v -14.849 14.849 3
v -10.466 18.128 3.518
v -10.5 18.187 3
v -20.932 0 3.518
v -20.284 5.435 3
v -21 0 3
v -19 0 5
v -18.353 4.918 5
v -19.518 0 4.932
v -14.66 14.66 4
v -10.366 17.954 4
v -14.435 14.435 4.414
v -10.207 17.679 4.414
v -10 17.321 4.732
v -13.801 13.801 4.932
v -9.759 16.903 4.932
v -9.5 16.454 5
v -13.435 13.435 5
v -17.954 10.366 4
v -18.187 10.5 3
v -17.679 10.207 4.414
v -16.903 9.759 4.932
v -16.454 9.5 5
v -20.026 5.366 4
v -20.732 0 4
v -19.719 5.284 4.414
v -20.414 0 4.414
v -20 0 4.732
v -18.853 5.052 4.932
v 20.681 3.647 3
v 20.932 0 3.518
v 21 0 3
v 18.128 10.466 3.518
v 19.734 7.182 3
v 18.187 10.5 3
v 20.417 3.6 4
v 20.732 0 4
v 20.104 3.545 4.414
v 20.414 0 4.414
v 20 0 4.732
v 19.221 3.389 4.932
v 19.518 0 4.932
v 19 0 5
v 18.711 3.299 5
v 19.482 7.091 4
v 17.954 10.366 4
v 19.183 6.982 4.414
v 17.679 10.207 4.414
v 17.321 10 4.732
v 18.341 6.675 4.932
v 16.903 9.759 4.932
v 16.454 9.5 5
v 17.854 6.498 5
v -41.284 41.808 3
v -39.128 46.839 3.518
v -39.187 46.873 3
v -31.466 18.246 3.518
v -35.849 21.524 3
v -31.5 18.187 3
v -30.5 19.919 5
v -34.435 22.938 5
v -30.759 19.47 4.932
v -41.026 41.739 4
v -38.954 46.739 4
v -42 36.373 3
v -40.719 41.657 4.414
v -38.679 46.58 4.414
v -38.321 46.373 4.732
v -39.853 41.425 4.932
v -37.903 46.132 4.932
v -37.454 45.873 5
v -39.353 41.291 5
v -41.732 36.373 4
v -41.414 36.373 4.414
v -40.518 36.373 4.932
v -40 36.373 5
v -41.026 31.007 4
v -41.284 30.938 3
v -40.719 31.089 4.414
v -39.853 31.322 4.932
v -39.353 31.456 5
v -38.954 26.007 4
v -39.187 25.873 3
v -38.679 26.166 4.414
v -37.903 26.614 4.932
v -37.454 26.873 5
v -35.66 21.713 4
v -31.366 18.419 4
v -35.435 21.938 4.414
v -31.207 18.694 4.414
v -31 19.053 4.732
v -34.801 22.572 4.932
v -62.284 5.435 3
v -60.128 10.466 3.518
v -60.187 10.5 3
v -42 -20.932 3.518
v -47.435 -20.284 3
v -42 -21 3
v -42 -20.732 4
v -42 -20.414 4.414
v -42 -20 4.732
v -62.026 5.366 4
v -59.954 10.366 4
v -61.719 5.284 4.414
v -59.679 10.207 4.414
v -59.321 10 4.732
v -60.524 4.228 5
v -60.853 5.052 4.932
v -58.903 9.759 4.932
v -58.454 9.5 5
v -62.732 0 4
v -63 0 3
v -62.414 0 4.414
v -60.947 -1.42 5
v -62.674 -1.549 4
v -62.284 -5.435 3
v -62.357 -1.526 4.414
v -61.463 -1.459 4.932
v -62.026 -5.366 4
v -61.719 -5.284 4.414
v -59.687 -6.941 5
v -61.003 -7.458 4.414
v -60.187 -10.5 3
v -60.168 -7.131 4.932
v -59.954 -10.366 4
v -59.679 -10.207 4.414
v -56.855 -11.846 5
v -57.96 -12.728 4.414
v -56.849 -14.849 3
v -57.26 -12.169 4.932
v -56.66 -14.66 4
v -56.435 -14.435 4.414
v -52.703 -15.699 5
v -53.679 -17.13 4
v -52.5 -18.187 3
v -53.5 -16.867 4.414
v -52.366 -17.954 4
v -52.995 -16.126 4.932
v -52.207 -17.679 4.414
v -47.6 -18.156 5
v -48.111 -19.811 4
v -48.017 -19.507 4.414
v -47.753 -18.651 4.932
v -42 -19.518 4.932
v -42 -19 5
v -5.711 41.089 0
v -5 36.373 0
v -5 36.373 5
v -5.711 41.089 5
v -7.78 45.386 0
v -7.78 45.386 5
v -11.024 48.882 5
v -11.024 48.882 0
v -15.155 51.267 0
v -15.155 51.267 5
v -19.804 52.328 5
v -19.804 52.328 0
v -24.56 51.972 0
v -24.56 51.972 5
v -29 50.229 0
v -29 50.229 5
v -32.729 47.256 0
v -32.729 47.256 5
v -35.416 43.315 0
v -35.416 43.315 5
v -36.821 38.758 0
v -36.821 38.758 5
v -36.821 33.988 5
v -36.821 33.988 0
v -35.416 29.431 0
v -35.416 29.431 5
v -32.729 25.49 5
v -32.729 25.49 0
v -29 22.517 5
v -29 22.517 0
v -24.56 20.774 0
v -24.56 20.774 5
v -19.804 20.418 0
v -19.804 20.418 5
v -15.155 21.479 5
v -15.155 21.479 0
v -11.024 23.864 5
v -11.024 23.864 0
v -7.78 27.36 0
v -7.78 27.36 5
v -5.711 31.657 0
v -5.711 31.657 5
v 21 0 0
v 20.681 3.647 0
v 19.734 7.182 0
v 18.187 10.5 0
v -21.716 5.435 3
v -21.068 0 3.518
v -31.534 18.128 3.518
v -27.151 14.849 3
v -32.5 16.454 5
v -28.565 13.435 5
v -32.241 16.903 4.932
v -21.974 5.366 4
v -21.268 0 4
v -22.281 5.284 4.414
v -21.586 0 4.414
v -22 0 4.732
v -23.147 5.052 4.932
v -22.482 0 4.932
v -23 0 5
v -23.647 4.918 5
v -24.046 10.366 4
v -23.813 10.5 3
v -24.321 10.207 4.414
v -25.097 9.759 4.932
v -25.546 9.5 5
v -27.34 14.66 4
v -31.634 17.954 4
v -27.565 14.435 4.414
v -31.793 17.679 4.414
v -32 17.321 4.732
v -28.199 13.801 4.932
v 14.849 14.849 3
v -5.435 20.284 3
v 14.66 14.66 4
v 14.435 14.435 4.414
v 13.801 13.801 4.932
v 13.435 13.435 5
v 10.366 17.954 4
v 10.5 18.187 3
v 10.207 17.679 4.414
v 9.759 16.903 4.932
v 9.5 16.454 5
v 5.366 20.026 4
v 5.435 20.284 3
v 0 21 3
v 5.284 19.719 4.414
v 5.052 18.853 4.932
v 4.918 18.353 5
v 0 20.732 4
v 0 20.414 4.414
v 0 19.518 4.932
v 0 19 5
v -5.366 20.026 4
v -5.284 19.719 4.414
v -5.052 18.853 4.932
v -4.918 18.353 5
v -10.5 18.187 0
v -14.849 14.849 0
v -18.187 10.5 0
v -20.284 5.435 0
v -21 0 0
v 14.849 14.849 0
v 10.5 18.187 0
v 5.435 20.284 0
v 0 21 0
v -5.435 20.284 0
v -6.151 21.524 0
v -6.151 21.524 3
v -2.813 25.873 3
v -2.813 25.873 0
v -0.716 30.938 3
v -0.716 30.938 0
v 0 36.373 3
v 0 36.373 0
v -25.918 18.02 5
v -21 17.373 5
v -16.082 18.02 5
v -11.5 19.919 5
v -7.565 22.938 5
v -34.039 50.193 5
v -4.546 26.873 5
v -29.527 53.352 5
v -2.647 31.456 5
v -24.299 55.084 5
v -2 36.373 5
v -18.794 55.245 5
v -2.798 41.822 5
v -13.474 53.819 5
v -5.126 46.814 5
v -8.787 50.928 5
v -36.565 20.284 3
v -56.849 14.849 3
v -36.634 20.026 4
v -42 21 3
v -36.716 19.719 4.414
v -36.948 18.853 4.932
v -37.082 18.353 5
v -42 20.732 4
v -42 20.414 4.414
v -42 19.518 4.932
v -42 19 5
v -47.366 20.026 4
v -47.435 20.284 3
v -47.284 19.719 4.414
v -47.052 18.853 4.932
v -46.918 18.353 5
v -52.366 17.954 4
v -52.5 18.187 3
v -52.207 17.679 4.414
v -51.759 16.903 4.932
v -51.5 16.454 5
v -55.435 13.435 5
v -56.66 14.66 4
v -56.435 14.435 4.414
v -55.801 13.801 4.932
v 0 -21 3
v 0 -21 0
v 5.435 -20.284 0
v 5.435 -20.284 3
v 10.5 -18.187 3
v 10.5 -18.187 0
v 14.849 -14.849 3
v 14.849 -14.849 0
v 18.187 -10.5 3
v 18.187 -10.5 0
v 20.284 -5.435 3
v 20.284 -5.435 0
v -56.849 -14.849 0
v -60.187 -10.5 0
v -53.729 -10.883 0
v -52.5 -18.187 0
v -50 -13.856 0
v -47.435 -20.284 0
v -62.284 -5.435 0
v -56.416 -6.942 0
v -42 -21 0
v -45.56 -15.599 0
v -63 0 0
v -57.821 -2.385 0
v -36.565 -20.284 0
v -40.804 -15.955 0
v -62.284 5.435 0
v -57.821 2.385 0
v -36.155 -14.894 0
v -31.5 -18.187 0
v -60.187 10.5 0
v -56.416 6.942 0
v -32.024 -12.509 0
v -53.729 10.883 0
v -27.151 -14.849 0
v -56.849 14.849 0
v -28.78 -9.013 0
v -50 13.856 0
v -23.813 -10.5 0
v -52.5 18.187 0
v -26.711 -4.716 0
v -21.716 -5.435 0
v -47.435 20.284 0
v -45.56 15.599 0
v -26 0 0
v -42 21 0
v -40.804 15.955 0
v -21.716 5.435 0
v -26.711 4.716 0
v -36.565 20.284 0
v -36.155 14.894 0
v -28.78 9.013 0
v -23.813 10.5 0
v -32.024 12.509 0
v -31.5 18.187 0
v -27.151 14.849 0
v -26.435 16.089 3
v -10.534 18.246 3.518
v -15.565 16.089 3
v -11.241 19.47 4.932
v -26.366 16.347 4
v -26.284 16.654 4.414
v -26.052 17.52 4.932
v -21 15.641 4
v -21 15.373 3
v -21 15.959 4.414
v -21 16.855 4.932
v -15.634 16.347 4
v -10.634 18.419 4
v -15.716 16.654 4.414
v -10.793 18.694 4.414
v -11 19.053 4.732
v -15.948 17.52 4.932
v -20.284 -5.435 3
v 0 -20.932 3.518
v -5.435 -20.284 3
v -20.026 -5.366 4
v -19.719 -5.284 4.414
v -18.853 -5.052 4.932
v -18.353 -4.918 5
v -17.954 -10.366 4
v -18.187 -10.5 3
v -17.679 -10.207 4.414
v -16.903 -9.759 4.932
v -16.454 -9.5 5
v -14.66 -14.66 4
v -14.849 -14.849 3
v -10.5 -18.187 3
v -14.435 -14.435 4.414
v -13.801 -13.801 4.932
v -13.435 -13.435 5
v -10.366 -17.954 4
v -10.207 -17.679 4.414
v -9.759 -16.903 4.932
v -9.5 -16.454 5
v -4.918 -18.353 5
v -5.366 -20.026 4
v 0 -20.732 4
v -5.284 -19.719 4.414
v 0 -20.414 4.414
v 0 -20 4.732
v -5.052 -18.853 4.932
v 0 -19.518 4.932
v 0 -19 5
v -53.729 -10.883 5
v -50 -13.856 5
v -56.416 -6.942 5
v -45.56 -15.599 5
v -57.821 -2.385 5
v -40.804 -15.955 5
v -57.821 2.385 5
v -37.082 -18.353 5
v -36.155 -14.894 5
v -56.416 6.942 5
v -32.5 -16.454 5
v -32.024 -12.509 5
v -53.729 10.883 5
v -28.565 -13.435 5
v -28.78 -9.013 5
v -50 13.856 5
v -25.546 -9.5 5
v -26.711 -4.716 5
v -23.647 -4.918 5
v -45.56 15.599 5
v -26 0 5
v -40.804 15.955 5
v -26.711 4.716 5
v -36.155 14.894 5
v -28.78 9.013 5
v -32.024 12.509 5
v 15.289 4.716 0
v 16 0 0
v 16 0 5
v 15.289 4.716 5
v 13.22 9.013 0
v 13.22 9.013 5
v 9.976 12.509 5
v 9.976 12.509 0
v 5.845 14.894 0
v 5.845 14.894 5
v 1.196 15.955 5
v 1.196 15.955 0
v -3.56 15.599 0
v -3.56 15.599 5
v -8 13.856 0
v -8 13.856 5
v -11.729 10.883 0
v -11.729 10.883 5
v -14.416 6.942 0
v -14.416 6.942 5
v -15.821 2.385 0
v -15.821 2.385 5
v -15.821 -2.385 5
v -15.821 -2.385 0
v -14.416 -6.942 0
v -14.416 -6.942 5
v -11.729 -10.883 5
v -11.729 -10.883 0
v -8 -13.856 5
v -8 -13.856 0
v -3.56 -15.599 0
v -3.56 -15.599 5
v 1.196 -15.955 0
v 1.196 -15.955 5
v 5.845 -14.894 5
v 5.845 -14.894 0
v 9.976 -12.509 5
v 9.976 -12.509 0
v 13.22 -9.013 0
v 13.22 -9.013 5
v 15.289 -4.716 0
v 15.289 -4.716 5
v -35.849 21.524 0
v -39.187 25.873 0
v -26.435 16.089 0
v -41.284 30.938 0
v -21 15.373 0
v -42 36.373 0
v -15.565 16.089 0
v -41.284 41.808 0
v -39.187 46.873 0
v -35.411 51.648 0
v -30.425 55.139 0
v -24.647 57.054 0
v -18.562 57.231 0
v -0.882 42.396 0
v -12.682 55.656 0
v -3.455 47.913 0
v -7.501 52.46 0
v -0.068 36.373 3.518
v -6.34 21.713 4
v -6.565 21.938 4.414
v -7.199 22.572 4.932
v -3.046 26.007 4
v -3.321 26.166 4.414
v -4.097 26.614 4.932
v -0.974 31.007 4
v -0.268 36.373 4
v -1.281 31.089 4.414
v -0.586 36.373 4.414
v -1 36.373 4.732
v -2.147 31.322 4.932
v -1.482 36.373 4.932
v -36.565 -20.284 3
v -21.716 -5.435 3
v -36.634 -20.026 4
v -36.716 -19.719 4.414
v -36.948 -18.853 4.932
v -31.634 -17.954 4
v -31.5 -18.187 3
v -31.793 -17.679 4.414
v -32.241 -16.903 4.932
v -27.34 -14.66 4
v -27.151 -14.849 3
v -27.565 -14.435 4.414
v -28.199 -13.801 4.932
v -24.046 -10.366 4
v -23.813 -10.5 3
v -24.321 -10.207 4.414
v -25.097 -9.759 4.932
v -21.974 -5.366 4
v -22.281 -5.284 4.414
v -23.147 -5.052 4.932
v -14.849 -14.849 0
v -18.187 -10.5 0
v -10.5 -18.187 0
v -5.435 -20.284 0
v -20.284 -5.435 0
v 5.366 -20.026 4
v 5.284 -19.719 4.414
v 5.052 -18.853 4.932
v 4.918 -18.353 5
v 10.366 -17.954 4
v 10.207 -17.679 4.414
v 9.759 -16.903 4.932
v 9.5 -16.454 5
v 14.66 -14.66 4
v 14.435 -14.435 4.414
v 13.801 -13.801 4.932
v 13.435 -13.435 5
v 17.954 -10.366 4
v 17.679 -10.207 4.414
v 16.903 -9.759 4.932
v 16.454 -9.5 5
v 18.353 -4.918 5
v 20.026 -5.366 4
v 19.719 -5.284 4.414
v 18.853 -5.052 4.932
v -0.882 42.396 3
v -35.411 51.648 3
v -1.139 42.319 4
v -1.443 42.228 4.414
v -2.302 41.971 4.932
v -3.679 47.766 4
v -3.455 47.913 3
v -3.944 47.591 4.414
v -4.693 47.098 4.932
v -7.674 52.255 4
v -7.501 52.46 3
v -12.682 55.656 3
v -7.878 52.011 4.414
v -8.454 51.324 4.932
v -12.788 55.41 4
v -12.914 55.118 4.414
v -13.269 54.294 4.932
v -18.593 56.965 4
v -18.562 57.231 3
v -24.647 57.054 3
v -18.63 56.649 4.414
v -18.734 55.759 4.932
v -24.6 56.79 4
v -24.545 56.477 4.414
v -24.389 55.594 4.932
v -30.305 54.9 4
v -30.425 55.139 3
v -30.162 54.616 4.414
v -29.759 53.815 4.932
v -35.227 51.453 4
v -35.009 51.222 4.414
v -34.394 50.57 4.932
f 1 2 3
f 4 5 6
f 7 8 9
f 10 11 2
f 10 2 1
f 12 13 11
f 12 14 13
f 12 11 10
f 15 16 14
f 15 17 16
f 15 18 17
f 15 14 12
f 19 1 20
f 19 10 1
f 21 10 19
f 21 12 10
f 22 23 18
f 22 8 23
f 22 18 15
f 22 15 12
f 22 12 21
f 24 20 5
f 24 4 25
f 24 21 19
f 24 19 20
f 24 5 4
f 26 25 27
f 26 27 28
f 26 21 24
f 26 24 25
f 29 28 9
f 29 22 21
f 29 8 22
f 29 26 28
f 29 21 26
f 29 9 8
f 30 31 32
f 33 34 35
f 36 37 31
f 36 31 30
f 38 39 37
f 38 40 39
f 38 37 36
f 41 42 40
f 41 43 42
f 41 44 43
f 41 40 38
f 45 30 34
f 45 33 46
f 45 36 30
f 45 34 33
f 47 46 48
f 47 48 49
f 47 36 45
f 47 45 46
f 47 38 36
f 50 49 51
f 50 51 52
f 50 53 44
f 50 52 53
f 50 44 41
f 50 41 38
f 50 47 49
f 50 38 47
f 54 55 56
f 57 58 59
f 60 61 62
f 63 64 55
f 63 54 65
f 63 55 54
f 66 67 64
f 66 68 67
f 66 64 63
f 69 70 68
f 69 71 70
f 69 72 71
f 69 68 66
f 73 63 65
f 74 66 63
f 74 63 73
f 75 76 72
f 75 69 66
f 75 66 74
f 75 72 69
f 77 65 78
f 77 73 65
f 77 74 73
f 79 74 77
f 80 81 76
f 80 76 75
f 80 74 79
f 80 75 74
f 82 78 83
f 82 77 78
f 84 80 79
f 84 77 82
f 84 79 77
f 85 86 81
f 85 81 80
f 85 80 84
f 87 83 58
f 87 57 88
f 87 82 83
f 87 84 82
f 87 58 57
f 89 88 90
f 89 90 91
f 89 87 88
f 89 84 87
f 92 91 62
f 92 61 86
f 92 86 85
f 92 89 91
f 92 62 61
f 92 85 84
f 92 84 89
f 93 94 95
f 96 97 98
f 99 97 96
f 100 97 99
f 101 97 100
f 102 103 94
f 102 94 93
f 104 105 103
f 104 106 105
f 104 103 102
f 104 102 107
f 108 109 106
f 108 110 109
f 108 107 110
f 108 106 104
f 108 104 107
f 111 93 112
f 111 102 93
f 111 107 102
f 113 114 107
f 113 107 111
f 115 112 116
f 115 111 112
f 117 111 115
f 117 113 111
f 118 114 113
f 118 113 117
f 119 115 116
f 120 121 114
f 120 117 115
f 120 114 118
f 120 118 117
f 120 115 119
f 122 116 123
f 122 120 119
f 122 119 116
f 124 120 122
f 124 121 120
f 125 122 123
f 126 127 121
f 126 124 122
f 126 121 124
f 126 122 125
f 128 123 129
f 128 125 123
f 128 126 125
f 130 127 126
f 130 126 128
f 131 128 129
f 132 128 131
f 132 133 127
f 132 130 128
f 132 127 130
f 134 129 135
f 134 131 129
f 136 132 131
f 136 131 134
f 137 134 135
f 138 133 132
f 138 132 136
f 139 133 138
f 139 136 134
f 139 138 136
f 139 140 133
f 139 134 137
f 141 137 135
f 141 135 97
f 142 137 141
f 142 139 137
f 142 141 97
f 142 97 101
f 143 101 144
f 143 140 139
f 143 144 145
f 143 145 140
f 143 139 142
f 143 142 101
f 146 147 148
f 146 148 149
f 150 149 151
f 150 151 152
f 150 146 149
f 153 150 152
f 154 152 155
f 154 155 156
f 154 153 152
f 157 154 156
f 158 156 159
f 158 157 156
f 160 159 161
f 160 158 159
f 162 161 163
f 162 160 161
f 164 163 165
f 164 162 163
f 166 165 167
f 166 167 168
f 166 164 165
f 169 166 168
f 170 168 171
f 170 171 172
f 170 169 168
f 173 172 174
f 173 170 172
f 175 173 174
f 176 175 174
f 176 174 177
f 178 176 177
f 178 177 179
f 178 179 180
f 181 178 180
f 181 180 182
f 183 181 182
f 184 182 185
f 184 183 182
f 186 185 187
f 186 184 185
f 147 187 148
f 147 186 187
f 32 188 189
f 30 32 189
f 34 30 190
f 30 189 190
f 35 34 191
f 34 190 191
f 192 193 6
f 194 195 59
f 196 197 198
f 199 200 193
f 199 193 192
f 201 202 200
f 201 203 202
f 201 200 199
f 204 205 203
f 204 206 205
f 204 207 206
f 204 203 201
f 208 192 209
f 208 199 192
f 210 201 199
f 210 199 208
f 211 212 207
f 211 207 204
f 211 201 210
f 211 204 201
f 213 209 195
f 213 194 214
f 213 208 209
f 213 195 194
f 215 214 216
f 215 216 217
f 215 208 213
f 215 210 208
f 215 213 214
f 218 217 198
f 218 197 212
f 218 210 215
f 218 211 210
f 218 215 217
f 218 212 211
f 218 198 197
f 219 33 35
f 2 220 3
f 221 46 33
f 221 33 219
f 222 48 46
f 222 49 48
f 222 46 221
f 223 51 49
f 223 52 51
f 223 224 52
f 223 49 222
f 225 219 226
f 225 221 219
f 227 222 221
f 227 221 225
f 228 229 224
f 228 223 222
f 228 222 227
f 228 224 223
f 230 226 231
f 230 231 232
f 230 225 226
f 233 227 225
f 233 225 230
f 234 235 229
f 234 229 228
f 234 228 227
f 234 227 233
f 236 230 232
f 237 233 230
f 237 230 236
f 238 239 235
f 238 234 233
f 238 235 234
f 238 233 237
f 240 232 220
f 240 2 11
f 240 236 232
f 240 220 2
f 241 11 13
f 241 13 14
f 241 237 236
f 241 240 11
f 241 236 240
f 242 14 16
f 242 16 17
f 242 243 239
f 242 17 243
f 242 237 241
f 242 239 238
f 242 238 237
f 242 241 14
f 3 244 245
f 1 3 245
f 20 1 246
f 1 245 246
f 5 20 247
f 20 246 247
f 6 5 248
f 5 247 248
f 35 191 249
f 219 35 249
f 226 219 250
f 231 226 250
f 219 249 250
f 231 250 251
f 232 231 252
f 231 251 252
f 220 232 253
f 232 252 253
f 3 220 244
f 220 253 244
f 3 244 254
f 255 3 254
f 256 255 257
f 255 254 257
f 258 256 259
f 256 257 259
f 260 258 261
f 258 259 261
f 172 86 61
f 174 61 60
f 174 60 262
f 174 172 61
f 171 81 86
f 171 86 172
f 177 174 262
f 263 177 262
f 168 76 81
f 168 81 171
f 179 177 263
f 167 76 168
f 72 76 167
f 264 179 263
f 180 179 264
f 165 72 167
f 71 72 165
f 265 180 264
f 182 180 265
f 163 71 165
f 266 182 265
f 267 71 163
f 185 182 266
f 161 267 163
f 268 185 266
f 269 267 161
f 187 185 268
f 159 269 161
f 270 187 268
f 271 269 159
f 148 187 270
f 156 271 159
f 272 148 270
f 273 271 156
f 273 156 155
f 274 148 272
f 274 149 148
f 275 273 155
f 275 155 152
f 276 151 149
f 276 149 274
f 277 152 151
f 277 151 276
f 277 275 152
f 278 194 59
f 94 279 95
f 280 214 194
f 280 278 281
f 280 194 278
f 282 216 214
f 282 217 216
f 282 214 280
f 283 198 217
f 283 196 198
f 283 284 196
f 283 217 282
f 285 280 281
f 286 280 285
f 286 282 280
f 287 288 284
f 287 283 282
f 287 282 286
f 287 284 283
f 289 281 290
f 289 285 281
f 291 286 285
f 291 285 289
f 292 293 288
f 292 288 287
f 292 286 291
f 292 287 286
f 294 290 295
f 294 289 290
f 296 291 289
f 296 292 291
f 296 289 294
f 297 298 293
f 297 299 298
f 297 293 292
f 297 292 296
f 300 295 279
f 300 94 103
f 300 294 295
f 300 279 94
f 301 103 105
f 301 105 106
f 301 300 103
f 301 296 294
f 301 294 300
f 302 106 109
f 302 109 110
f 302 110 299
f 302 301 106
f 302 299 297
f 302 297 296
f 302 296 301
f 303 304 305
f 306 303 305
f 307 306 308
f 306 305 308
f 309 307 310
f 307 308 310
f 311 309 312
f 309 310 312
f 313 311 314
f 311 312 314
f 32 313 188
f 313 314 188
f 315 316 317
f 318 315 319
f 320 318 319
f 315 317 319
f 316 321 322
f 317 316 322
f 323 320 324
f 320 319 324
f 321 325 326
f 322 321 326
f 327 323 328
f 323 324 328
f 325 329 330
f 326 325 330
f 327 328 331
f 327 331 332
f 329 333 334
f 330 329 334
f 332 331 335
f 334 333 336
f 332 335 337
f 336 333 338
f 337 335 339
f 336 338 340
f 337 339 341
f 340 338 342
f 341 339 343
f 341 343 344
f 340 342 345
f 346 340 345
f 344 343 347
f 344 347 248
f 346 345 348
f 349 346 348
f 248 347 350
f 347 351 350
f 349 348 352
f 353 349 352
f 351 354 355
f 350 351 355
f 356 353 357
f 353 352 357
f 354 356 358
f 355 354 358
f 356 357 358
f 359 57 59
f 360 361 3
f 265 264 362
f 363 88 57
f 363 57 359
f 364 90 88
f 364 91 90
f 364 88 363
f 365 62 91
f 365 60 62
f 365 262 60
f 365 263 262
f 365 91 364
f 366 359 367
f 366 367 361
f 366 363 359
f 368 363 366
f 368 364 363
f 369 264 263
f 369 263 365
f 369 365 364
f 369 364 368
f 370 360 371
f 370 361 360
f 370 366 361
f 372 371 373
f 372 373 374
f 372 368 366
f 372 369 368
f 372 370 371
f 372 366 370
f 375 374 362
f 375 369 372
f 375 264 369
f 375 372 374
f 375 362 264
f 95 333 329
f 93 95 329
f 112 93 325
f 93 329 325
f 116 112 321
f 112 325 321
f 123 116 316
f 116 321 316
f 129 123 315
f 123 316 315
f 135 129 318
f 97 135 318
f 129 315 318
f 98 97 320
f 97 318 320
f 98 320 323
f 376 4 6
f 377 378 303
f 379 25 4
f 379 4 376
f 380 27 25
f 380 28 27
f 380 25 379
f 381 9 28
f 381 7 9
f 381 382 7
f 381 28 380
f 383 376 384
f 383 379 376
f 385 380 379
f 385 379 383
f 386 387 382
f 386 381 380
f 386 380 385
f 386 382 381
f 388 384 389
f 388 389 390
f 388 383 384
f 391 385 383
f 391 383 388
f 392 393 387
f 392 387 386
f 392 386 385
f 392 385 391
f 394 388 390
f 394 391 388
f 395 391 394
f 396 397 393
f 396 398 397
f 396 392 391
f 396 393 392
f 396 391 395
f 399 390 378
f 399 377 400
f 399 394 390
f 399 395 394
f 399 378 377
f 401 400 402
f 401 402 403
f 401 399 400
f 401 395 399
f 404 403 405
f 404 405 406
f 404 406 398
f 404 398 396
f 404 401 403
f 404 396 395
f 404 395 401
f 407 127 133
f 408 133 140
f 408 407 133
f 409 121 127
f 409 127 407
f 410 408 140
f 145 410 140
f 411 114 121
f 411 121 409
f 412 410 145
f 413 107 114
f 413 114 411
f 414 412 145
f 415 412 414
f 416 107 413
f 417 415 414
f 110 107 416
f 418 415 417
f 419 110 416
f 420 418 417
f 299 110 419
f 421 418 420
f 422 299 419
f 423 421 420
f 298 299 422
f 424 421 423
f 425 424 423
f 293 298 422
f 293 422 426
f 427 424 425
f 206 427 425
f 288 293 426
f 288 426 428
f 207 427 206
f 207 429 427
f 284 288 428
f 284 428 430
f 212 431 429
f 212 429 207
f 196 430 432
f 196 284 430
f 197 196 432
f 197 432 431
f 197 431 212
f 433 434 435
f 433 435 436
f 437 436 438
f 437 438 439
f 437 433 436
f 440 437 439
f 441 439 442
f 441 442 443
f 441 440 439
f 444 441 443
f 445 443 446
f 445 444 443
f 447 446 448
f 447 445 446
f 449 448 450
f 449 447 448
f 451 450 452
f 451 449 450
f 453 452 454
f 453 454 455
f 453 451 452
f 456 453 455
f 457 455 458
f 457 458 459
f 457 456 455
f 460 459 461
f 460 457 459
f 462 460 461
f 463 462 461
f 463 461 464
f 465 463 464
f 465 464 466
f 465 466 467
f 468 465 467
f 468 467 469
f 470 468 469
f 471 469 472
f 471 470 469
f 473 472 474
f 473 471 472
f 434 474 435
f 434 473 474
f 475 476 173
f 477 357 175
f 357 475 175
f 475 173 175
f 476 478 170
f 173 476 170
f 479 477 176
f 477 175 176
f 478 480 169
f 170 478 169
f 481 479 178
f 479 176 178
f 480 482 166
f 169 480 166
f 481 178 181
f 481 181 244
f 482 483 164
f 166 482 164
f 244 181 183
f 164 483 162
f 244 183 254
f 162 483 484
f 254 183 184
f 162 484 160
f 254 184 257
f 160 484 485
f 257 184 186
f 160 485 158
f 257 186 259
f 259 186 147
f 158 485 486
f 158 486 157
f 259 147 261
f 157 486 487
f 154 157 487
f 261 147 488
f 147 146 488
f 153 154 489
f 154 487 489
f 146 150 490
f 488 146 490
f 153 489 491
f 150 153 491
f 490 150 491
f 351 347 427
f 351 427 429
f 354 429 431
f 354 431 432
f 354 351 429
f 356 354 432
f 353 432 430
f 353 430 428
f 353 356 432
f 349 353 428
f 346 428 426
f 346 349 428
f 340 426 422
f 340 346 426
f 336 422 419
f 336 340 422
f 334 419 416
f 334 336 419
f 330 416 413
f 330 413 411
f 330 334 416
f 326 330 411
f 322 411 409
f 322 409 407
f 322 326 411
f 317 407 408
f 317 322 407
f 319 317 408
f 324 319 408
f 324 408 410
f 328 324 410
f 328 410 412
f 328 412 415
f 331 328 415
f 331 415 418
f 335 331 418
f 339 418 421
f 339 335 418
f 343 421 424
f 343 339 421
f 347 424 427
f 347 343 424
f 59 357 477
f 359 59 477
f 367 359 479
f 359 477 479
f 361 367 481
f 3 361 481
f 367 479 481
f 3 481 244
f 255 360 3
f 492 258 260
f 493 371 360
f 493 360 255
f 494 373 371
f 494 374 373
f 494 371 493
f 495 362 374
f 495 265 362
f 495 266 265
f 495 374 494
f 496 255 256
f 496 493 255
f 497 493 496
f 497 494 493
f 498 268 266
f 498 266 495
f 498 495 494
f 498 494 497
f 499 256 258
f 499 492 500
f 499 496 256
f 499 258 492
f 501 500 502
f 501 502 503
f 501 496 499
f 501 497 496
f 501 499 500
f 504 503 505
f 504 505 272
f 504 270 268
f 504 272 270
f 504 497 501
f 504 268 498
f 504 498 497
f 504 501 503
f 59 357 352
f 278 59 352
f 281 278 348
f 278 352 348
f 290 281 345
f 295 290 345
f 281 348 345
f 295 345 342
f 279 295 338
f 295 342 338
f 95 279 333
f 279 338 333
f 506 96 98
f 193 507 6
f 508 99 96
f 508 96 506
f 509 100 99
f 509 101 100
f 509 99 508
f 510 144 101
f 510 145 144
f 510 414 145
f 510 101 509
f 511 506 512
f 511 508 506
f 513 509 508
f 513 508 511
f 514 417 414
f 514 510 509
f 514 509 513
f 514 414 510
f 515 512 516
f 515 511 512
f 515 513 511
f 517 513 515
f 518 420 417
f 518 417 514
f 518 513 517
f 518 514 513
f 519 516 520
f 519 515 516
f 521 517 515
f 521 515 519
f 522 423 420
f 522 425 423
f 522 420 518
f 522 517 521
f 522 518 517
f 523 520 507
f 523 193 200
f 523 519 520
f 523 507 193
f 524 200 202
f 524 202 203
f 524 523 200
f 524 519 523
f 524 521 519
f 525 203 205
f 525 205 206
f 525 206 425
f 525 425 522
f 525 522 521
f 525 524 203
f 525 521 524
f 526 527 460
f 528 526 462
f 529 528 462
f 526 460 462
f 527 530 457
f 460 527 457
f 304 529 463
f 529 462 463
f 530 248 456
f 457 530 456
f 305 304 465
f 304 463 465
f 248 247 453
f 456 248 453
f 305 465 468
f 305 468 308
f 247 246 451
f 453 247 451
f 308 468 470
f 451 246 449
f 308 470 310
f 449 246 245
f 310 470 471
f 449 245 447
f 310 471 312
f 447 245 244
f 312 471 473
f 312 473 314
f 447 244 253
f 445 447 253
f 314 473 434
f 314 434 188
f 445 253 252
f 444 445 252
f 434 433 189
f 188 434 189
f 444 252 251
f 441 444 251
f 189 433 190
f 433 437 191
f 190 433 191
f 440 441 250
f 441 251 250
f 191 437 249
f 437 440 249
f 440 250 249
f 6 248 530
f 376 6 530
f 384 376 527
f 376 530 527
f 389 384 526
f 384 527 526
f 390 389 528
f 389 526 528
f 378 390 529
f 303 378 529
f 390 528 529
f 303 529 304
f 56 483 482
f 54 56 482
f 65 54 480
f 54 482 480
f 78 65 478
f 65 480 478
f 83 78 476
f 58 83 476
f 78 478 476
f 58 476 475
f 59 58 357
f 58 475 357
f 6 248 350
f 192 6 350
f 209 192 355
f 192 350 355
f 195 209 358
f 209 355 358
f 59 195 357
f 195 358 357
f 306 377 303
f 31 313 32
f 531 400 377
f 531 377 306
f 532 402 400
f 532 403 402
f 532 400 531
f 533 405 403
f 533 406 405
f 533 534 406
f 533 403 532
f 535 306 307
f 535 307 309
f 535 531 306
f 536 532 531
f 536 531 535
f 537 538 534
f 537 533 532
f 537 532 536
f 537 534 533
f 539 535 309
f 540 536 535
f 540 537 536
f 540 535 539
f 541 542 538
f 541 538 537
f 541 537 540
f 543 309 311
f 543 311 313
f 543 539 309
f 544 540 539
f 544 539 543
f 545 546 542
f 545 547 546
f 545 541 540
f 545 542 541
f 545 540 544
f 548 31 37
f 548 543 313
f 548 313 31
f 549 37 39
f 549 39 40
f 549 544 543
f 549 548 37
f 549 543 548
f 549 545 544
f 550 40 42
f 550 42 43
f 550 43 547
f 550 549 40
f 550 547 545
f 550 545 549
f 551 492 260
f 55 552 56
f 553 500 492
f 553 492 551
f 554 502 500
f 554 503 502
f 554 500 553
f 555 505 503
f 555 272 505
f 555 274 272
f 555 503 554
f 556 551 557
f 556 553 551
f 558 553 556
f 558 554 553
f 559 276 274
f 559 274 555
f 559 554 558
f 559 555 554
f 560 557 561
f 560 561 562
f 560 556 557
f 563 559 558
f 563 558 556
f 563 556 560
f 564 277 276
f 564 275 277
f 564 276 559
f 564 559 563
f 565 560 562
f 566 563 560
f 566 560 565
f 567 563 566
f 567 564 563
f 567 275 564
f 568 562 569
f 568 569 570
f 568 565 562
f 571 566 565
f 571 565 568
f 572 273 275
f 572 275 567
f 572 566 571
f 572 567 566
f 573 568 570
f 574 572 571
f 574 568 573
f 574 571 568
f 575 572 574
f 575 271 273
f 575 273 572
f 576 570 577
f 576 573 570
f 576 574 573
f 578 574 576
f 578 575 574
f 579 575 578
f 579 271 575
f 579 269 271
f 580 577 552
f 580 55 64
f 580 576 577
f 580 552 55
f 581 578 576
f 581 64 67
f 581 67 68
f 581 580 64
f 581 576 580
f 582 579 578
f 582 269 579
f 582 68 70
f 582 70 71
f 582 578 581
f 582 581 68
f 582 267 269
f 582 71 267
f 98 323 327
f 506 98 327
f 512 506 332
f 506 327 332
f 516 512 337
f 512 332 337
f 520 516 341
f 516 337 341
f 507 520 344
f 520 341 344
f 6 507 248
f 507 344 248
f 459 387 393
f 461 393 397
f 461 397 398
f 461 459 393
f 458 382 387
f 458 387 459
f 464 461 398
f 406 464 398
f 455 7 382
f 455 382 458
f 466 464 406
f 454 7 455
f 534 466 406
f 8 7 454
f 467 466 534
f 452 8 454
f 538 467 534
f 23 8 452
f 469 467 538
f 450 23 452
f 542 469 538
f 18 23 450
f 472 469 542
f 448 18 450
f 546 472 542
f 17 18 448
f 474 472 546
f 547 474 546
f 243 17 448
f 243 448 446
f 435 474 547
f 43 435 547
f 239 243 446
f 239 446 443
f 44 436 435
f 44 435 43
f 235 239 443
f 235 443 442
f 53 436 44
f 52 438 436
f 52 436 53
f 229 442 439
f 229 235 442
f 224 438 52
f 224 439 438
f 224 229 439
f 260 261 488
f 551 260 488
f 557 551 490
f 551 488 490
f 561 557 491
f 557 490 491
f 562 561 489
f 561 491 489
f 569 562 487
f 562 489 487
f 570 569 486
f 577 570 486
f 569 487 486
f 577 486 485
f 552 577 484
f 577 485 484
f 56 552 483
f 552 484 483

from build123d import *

# Parameters (mm, degrees)
F0_R     = 16
F1_DEPTH = 5
F2_R     = 2
F2_2_R   = 2
F2_3_R   = 2


with BuildPart() as f1:
    # F0 (on Top) → F1 (new body)
    with BuildSketch(Plane.XY):
        with BuildLine():
            ThreePointArc((-42.0000000626, -21), (-27.1507576172, -14.849242427), (-21, 0))
            ThreePointArc((-21, 0), (-23.8134663476, 10.4999997004), (-31.4999994009, 18.1865331336))
            ThreePointArc((-31.4999994009, 18.1865331336), (-47.4351994623, 20.284442482), (-60.1865333234, 10.5000002703))
            ThreePointArc((-60.1865333234, 10.5000002703), (-60.1865335731, -10.4999998378), (-42.0000000626, -21))
        make_face()
        with Locations((-42, 0)):
            Circle(F0_R, mode=Mode.SUBTRACT)
    extrude(amount=F1_DEPTH)

    # F2
    f2_edges = [f1.edges().sort_by_distance(p)[0] for p in [
        (-42, 21, 5),
    ]]
    fillet(f2_edges, radius=F2_R)


with BuildPart() as f1b:
    # F0 (on Top) → F1, piece 2 (new body)
    with BuildSketch(Plane.XY):
        with BuildLine():
            ThreePointArc((-6.26e-08, -21), (14.8492423828, -14.849242427), (21, 0))
            ThreePointArc((21, 0), (20.2844424165, 5.4351997065), (18.1865337286, 10.4999995685))
            ThreePointArc((18.1865337286, 10.4999995685), (5.4352004706, 20.2844422118), (-10.4999994928, 18.1865337723))
            ThreePointArc((-10.4999994928, 18.1865337723), (-18.1865333331, 10.5000002536), (-21, 0))
            ThreePointArc((-21, 0), (-14.849242427, -14.8492423828), (-6.26e-08, -21))
        make_face()
        Circle(F0_R, mode=Mode.SUBTRACT)
    extrude(amount=F1_DEPTH)

    # F2#2
    f2_2_edges = [f1b.edges().sort_by_distance(p)[0] for p in [
        (-18.186534, -10.5, 5),
    ]]
    fillet(f2_2_edges, radius=F2_2_R)


with BuildPart() as f1c:
    # F0 (on Top) → F1, piece 3 (new body)
    with BuildSketch(Plane.XY):
        with BuildLine():
            ThreePointArc((-31.4999994009, 18.1865331336), (-20.9999993613, 15.3730669589), (-10.4999994928, 18.1865337723))
            ThreePointArc((-10.4999994928, 18.1865337723), (-2.8134663741, 25.8730672125), (0, 36.3730669589))
            ThreePointArc((0, 36.3730669589), (-0.7155577531, 41.8082672987), (-2.813466927, 46.873067663))
            ThreePointArc((-2.813466927, 46.873067663), (-21.0000002875, 57.3730669589), (-39.1865333605, 46.8730671651))
            ThreePointArc((-39.1865333605, 46.8730671651), (-41.2844422933, 30.9378667926), (-31.4999994009, 18.1865331336))
        make_face()
        with Locations((-21, 36.3730669589)):
            Circle(F0_R, mode=Mode.SUBTRACT)
    extrude(amount=F1_DEPTH)

    # F2#3
    f2_3_edges = [f1c.edges().sort_by_distance(p)[0] for p in [
        (-10.500001, 54.559601, 5),
    ]]
    fillet(f2_3_edges, radius=F2_3_R)


solid = Compound([f1.part, f1b.part, f1c.part])
